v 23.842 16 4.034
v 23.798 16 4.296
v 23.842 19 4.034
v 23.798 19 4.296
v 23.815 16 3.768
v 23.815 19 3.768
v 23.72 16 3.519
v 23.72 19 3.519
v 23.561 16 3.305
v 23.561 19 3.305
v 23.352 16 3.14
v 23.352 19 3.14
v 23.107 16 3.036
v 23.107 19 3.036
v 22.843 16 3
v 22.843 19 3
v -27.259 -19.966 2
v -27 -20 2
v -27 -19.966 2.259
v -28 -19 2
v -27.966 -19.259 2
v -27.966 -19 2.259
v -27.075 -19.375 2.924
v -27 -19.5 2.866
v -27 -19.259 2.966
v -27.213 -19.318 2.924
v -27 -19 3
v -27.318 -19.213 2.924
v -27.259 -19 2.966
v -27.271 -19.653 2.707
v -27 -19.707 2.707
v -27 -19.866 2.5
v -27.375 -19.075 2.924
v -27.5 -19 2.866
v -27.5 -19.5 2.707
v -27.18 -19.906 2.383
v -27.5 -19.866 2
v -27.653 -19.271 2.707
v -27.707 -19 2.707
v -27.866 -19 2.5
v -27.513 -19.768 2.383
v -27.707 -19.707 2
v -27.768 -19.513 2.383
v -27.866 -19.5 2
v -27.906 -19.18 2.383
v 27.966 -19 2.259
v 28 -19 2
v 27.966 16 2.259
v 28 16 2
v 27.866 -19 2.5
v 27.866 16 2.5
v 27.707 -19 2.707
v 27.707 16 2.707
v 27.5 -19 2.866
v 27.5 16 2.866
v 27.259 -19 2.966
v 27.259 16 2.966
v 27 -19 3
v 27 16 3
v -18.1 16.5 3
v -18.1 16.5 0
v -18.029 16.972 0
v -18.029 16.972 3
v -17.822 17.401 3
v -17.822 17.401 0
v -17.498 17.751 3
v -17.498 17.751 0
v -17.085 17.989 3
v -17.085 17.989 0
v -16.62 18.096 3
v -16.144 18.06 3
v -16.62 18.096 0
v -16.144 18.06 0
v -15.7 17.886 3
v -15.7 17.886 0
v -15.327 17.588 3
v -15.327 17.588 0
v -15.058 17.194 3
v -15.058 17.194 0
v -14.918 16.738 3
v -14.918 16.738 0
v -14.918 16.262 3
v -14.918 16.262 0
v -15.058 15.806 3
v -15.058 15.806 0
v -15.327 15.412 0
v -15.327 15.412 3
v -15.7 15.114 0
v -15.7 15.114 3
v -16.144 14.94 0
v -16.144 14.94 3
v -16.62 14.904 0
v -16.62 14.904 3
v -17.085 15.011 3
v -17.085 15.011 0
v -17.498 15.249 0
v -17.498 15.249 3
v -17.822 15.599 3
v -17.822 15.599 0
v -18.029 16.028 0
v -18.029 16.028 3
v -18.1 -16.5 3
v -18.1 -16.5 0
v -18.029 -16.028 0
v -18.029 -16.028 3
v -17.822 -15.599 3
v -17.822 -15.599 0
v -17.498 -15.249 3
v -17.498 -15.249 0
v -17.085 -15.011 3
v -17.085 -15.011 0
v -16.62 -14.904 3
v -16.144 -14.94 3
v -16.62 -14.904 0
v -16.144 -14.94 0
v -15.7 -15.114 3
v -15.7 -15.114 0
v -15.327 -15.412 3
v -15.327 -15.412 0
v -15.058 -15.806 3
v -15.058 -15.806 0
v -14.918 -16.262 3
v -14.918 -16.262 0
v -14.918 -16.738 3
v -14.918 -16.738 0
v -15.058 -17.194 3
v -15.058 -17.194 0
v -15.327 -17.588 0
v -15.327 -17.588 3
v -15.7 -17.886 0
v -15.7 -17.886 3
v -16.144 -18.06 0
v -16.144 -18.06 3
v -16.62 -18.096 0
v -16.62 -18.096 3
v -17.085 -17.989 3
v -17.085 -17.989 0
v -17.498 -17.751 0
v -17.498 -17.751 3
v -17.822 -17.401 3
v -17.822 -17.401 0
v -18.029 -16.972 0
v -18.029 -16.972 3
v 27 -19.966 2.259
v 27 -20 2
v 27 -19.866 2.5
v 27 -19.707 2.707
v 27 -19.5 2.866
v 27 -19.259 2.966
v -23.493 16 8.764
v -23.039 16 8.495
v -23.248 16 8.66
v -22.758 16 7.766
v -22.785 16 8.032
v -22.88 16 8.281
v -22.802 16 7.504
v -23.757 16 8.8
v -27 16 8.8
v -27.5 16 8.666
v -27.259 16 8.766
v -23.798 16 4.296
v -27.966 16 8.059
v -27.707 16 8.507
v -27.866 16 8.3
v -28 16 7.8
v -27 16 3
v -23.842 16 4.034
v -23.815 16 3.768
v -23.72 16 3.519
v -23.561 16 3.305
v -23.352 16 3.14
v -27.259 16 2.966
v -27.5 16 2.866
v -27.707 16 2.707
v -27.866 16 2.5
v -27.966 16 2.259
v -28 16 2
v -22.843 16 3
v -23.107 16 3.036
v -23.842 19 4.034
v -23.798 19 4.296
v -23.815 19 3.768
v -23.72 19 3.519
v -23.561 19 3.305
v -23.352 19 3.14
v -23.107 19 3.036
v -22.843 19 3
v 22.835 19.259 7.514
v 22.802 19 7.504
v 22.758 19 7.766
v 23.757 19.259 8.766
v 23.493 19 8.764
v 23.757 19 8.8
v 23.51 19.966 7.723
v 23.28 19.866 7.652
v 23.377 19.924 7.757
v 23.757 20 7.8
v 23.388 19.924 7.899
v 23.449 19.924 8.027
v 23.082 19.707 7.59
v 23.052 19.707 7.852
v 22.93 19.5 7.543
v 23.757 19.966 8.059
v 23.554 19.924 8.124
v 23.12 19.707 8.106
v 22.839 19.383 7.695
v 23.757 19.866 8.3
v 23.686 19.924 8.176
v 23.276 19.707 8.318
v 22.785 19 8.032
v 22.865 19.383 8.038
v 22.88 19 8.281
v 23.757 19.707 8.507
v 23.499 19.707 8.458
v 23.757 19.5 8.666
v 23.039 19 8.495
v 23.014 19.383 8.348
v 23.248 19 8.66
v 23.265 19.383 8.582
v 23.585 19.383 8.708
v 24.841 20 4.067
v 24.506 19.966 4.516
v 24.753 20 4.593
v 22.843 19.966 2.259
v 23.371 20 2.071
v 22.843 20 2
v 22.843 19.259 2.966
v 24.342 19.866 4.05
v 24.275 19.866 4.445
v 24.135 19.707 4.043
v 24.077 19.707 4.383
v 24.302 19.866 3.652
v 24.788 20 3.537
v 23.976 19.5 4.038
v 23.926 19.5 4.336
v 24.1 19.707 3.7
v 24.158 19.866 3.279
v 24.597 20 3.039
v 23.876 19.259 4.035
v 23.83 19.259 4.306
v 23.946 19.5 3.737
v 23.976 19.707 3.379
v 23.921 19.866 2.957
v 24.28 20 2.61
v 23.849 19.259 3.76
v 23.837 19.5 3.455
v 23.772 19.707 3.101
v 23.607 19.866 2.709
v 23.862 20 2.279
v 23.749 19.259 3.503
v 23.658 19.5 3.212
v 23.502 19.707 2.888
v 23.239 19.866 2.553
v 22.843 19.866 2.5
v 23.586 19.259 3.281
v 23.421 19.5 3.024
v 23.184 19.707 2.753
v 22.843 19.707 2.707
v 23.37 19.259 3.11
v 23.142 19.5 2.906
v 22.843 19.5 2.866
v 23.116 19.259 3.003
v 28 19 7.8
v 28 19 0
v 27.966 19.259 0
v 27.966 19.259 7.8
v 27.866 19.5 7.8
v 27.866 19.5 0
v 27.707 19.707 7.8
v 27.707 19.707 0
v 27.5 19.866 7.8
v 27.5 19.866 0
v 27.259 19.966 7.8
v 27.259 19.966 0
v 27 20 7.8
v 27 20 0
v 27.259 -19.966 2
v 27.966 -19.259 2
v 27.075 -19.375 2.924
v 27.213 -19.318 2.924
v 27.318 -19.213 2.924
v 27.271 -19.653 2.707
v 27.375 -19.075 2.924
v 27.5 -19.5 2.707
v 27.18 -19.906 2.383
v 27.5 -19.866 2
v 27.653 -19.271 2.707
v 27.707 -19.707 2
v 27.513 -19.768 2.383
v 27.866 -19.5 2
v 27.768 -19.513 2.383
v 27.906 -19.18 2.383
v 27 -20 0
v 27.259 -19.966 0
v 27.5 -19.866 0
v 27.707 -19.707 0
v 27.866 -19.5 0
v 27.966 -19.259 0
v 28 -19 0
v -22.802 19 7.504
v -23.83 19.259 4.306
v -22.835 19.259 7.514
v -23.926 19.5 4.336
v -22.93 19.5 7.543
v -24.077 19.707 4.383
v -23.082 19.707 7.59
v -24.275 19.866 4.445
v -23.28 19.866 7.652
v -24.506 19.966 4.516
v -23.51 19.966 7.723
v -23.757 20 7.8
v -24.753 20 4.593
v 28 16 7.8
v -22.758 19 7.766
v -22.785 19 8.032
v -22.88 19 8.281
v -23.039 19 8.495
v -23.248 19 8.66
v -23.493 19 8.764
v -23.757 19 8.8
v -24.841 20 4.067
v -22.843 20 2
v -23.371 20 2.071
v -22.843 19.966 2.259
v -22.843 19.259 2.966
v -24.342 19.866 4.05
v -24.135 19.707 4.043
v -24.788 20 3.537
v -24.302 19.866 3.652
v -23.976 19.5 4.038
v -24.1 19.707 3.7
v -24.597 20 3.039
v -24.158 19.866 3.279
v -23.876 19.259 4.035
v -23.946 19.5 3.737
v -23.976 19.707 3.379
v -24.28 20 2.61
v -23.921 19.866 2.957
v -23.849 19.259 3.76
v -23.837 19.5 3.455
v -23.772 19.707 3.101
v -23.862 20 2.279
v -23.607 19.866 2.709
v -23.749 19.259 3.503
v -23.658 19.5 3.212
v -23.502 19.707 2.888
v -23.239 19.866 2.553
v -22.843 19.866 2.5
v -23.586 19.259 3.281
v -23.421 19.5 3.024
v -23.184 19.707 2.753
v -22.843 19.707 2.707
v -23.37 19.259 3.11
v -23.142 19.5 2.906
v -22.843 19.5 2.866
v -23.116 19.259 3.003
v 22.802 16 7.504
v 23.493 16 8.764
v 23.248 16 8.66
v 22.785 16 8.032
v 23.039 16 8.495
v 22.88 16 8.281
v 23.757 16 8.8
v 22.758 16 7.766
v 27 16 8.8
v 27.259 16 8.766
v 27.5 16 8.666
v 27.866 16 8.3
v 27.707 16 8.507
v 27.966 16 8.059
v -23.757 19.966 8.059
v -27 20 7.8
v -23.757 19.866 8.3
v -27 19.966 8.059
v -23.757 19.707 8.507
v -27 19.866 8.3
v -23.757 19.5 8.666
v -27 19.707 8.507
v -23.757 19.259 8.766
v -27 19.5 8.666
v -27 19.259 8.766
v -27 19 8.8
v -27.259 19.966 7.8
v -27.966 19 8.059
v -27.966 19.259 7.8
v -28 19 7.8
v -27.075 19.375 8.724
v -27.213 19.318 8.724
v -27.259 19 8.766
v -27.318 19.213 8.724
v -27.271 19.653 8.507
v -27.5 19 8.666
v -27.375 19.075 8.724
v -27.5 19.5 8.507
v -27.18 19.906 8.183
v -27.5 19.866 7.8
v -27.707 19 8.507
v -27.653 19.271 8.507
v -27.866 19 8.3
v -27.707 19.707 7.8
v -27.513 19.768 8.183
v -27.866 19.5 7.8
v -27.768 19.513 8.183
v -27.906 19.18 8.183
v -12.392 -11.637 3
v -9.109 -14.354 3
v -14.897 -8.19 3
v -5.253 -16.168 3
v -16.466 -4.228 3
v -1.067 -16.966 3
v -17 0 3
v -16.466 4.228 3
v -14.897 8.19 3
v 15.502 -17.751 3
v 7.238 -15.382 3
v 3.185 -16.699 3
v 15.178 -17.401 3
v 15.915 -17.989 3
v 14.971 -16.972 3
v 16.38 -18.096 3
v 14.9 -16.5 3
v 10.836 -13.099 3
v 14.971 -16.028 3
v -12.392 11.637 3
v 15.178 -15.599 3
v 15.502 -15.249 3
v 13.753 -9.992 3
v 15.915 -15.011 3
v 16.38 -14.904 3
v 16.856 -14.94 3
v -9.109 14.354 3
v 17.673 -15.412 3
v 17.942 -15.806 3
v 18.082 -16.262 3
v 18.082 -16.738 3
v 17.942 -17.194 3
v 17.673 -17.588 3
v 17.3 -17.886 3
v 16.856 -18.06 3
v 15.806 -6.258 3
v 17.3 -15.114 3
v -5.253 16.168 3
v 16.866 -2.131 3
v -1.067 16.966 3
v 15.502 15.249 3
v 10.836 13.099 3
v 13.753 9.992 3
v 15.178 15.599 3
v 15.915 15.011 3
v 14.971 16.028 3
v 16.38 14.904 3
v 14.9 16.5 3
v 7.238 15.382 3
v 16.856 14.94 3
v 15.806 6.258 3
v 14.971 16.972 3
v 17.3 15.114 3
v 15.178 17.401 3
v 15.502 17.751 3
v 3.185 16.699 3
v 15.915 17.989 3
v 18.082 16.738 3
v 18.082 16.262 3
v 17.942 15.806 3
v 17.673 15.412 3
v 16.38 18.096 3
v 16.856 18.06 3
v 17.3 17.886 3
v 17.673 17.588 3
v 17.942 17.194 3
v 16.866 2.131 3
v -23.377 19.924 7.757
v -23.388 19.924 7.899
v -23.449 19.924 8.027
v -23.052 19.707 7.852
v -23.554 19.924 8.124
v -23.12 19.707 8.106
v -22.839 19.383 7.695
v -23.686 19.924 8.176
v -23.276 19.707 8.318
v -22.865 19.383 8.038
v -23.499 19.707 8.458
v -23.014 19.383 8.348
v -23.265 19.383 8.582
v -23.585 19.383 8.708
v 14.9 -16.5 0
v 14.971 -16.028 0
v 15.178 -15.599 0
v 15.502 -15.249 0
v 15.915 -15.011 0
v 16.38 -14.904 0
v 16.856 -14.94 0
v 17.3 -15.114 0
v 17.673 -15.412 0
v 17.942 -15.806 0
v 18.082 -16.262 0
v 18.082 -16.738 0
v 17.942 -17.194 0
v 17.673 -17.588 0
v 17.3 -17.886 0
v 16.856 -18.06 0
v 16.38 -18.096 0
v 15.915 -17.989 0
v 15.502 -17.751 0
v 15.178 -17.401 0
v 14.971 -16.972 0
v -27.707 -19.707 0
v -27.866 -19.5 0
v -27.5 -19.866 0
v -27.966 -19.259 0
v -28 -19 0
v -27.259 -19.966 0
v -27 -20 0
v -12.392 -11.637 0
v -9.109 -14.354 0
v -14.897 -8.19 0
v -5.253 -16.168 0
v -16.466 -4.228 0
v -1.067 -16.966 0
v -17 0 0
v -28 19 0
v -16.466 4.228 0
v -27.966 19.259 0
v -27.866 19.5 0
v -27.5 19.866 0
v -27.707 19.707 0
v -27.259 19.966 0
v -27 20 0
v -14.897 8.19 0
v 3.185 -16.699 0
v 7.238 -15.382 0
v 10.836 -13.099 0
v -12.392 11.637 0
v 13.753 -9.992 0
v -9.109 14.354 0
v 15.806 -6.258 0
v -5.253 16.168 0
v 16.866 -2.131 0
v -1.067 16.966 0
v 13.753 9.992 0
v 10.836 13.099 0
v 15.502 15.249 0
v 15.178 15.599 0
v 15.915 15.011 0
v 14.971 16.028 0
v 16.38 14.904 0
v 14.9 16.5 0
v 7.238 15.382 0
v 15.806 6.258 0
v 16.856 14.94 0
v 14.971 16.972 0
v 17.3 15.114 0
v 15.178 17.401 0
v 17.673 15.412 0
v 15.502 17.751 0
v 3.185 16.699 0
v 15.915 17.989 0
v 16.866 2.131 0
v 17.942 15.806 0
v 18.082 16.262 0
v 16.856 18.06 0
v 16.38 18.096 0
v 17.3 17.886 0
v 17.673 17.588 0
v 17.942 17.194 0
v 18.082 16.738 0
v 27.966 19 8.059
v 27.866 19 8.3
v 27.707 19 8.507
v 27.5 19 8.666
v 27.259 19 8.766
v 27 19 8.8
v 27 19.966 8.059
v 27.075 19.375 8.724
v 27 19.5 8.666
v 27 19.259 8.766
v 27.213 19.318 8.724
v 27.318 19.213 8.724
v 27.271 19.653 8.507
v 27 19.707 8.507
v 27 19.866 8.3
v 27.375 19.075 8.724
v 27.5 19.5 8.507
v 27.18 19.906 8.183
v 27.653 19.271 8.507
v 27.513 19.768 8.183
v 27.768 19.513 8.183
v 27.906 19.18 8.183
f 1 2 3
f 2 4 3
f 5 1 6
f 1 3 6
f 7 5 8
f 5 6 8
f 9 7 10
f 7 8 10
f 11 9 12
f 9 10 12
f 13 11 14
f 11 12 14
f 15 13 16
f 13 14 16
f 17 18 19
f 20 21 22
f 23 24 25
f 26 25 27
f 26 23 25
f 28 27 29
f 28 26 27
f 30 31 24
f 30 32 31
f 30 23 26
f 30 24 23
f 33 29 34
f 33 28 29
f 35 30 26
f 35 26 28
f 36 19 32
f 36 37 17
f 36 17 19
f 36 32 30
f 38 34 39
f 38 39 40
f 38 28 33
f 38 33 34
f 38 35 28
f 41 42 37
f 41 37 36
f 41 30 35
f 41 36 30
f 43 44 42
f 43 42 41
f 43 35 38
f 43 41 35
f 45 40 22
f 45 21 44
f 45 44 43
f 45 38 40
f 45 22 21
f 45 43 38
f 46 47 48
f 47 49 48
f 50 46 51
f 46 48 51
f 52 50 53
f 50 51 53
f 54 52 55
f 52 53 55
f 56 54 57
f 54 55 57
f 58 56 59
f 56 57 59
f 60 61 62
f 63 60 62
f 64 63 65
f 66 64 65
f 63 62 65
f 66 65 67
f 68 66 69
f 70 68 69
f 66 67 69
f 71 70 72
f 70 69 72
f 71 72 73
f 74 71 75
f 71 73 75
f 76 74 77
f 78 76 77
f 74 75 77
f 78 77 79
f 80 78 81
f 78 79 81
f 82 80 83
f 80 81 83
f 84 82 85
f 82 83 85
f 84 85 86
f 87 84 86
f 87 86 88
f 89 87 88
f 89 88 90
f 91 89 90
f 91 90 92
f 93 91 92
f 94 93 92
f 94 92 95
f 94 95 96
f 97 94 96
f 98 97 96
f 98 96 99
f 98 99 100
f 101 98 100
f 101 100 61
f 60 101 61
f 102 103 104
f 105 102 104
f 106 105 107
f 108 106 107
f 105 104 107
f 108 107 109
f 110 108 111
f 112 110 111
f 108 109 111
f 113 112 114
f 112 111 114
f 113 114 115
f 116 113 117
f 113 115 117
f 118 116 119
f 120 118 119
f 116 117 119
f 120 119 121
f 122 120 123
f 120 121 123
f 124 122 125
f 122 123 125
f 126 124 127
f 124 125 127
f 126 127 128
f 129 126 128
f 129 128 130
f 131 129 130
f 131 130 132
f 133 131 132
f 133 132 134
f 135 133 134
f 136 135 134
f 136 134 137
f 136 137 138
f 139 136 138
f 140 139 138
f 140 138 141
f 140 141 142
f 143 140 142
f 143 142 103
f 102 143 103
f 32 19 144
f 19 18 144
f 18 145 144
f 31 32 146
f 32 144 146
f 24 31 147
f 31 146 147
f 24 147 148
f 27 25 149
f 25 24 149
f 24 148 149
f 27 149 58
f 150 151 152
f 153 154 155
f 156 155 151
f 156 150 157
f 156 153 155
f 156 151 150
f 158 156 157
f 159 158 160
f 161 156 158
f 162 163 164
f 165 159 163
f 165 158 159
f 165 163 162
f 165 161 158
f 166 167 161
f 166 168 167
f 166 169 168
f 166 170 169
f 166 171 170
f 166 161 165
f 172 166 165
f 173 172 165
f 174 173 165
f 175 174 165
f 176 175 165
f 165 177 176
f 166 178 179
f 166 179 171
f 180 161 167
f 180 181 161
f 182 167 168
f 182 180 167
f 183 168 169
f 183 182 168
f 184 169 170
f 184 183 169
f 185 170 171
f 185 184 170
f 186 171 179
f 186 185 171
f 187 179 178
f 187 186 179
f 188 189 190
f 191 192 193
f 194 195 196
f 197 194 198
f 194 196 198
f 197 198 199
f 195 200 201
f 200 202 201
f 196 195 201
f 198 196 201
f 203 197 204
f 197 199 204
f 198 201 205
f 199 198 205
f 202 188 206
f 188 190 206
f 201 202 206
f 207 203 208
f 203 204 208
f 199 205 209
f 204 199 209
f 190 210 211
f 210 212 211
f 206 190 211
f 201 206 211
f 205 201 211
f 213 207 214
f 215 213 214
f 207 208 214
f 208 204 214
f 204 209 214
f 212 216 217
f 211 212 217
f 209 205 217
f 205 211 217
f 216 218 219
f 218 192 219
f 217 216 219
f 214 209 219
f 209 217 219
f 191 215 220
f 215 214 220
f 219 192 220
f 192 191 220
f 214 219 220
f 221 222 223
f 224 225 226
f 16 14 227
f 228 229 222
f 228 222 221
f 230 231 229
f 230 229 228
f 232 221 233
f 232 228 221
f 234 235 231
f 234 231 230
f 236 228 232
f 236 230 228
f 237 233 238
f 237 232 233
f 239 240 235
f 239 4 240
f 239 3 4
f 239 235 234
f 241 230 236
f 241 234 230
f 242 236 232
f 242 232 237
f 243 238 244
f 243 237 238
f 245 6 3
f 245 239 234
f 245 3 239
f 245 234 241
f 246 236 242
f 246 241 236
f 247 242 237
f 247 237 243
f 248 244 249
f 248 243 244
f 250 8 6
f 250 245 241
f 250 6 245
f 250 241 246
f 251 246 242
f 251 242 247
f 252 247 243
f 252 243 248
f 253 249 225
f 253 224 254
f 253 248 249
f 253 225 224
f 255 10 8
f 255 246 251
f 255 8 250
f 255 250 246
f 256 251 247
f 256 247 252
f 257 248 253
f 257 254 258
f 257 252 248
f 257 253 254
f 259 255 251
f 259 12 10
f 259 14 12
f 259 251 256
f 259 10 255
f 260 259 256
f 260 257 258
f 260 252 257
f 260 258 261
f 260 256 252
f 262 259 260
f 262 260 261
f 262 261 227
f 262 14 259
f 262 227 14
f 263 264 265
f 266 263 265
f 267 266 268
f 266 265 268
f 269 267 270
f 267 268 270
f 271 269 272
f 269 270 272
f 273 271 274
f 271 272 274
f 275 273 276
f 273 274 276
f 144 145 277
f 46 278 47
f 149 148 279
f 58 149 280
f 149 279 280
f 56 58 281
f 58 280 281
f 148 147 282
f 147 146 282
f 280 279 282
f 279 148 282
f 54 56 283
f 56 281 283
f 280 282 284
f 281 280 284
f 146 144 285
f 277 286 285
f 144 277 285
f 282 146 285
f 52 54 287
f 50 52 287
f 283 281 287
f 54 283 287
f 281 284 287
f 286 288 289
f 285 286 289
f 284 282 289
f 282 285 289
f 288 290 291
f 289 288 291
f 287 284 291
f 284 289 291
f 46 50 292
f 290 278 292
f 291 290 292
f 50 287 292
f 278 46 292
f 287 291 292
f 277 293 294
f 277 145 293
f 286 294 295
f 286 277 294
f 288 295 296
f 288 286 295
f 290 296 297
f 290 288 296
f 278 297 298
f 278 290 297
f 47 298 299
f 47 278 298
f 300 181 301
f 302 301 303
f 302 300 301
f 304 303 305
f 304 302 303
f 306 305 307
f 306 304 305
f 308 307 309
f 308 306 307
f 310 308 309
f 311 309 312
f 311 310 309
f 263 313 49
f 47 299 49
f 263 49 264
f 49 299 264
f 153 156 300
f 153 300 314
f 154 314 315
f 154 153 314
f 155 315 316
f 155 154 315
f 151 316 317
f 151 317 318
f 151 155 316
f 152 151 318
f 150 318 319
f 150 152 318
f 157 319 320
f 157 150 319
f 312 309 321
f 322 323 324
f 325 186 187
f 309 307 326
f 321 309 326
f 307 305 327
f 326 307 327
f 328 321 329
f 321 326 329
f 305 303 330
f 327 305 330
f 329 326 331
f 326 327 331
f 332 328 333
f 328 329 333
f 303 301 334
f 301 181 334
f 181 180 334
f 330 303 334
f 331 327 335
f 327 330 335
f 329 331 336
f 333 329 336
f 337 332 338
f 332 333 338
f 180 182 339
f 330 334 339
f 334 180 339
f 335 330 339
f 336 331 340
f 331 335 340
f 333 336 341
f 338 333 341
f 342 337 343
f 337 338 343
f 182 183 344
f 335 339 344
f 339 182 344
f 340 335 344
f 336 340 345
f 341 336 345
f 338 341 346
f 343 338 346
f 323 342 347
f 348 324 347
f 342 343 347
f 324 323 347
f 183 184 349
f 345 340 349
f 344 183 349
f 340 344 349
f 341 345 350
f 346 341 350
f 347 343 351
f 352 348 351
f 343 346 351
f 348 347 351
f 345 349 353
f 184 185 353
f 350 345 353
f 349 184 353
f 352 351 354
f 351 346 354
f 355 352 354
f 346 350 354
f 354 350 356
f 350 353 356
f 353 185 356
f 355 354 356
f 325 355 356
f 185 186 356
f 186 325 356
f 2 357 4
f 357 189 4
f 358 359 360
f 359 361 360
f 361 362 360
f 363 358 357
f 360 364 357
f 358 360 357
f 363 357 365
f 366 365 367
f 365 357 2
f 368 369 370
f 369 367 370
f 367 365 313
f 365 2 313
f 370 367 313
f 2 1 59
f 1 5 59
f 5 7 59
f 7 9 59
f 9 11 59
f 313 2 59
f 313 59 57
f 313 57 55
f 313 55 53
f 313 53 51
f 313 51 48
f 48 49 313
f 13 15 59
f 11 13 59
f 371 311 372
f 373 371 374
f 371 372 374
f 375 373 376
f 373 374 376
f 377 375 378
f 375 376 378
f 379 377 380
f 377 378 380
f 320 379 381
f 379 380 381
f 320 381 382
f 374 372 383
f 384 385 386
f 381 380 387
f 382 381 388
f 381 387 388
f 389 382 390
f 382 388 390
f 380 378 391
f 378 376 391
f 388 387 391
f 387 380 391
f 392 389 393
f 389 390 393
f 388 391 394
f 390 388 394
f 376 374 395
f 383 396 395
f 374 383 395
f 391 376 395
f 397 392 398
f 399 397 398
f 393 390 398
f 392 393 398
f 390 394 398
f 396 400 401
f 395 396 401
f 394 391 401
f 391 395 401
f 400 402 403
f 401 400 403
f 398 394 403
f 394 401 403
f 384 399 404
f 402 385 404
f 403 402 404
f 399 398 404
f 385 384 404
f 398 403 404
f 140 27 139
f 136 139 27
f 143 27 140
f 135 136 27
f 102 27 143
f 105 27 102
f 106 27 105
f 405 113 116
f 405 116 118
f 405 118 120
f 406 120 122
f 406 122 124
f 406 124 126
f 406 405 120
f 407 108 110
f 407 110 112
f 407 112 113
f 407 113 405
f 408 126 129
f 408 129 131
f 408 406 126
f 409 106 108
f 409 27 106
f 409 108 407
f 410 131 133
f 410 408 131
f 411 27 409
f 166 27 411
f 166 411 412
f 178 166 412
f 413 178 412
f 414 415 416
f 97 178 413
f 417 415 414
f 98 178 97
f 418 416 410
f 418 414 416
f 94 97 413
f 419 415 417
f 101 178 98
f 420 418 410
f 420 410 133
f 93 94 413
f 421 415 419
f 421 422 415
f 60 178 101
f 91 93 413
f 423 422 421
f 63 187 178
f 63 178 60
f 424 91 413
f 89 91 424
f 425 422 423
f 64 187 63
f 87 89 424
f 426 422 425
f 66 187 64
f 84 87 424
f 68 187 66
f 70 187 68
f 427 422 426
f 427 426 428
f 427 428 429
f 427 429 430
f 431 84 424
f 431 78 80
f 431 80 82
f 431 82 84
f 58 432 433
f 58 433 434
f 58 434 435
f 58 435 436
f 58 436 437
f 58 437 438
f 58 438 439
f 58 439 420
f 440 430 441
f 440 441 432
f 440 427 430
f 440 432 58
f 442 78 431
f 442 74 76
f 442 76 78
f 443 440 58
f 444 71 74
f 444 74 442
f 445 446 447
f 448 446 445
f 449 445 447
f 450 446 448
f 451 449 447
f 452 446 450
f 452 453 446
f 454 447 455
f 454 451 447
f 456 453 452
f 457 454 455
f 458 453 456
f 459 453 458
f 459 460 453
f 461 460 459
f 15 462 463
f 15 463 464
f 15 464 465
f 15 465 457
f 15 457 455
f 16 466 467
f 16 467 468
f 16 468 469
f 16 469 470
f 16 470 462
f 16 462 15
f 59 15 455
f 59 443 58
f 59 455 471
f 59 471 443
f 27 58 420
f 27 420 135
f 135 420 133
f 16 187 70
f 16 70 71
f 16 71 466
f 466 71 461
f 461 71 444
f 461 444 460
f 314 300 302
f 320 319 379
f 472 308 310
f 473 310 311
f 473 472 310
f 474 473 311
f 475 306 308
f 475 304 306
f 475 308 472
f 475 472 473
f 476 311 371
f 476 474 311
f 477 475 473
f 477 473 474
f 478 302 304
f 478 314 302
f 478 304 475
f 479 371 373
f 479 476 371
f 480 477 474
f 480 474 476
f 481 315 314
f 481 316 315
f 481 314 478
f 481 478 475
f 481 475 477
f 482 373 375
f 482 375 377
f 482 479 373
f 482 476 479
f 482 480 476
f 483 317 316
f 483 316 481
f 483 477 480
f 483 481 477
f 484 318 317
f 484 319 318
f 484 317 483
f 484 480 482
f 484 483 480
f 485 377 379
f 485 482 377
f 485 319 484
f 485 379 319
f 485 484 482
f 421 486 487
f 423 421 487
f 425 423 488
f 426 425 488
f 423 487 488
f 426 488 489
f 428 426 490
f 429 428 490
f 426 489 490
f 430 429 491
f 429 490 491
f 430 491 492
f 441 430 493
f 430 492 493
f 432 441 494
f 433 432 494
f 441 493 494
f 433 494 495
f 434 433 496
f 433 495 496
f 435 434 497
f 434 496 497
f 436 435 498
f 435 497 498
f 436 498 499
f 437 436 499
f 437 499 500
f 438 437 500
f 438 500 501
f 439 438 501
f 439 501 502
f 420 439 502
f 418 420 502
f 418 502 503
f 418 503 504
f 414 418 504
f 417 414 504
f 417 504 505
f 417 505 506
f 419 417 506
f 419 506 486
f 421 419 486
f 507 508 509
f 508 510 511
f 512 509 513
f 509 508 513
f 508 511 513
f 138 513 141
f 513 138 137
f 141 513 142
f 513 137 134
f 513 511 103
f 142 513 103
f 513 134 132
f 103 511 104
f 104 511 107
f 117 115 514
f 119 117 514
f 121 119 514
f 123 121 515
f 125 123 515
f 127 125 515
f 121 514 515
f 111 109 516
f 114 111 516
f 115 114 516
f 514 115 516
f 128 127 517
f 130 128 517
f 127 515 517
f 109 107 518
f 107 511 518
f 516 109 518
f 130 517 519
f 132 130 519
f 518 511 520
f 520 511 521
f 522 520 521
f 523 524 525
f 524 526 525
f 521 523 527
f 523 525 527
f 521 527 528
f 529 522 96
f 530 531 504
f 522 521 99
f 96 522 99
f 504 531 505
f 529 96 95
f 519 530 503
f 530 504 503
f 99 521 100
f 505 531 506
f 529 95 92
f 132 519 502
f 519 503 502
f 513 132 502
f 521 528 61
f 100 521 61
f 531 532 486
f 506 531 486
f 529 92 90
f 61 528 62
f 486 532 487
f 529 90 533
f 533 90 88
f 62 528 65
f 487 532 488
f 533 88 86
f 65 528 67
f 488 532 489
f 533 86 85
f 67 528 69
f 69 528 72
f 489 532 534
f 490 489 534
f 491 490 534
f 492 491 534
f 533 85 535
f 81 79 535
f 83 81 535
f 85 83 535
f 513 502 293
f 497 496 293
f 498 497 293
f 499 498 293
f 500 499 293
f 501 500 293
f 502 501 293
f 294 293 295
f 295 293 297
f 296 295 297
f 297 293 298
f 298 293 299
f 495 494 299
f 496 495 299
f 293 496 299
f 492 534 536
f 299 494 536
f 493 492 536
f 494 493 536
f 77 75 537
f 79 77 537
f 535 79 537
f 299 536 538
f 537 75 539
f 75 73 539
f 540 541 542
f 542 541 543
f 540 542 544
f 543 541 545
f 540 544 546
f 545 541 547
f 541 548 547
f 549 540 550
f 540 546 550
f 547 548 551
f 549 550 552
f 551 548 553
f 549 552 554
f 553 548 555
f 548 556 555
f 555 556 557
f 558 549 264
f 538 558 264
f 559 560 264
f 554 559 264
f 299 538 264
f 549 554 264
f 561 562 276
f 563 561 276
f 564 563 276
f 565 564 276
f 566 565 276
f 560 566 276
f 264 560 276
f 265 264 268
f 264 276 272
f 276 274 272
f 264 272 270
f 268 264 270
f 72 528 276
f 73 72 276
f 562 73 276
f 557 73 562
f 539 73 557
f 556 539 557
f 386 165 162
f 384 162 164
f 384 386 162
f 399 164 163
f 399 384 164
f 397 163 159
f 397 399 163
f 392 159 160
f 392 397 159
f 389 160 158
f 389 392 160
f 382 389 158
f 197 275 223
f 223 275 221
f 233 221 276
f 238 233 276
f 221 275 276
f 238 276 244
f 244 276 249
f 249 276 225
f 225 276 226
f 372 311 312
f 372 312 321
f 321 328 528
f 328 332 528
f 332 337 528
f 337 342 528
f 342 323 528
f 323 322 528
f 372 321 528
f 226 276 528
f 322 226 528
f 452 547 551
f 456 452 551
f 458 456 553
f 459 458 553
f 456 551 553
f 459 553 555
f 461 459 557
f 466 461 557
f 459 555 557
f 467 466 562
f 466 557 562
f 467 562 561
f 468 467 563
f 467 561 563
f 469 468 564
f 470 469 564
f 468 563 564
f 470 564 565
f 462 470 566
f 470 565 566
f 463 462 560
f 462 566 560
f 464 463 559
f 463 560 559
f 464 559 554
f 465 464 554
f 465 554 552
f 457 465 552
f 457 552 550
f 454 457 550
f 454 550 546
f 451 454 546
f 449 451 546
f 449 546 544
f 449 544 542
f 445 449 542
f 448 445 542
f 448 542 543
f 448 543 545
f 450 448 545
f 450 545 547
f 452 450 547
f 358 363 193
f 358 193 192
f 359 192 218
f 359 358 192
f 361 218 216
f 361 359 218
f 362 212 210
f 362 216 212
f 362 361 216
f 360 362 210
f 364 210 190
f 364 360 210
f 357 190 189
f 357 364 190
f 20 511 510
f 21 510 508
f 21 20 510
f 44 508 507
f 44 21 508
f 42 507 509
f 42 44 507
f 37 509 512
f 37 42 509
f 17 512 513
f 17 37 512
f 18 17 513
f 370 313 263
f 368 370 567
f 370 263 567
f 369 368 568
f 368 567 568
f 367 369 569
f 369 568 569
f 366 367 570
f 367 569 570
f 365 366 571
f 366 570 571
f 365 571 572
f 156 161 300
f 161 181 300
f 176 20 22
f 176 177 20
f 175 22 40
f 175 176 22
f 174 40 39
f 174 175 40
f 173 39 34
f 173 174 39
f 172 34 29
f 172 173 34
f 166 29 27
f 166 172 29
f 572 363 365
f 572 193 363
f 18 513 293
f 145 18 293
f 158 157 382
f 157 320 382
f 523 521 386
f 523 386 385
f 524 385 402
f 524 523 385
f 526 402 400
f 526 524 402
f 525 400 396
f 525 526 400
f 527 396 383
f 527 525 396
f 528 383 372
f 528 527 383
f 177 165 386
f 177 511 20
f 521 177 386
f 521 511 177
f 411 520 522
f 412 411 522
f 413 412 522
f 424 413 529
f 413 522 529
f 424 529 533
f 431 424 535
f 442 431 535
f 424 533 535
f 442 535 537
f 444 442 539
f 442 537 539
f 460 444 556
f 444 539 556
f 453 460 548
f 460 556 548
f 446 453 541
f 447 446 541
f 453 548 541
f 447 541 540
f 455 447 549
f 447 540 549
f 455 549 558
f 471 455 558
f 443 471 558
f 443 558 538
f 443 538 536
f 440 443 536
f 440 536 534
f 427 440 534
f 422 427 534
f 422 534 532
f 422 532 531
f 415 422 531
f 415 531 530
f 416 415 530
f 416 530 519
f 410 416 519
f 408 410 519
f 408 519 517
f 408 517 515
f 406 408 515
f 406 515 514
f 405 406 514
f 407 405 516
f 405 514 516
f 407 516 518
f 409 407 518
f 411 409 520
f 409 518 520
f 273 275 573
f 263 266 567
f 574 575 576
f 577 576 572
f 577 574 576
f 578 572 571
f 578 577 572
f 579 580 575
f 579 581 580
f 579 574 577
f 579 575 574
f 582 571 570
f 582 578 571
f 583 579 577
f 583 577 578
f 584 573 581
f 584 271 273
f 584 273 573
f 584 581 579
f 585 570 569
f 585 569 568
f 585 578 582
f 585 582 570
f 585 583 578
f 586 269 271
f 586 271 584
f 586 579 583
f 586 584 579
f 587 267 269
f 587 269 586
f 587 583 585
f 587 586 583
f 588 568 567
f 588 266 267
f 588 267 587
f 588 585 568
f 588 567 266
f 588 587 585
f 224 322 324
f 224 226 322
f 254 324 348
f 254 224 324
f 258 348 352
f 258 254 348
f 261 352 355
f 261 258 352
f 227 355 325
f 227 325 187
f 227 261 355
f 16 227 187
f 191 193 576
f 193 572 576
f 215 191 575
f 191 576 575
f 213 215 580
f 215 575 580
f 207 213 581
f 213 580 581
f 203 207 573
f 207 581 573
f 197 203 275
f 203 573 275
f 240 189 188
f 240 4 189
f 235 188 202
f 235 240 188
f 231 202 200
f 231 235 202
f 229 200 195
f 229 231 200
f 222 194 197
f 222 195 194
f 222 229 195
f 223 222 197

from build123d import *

# Parameters (mm, degrees)
ESQUISSE1_W             = 56
ESQUISSE1_H             = 40
BOSS_EXTRU_1_DEPTH      = 3
ESQUISSE2_W             = 3.8
ESQUISSE2_H             = 4
BOSS_EXTRU_2_DEPTH      = 5.8
BOSS_EXTRU_3_DEPTH      = 4
CONG_1_R                = 1
ESQUISSE4_R             = 1.6
ENL_V_MAT_EXTRU_1_DEPTH = 9.8
ESQUISSE5_R             = 17
ENL_V_MAT_EXTRU_2_DEPTH = 9.8


with BuildPart() as part:
    # Esquisse1 → Boss.-Extru.1 (new body)
    with BuildSketch(Plane.XY):
        Rectangle(ESQUISSE1_W, ESQUISSE1_H)
    extrude(amount=BOSS_EXTRU_1_DEPTH)

    # Esquisse2 → Boss.-Extru.2 (add)
    with BuildSketch(Plane.XY.offset(3)):
        with Locations((-26.1, 18)):
            Rectangle(ESQUISSE2_W, ESQUISSE2_H)
        with Locations((26.1, 18)):
            Rectangle(ESQUISSE2_W, ESQUISSE2_H)
    extrude(amount=BOSS_EXTRU_2_DEPTH)

    # Esquisse3 → Boss.-Extru.3 (add)
    with BuildSketch(Plane(origin=(0, 20, 0), x_dir=(1, 0, 0), z_dir=(0, 1, 0))):
        Polygon((-24.2, -3), (-22.4, -8.8), (-24.2, -8.8), align=None)
        Polygon((24.2, -3), (24.2, -8.8), (22.4, -8.8), align=None)
    extrude(amount=-BOSS_EXTRU_3_DEPTH)

    # Congé1
    cong_1_edges = [part.edges().sort_by_distance(p)[0] for p in [
        (23.3, 20, 5.9),
        (-23.3, 20, 5.9),
        (28, -20, 1.5),
        (-28, -20, 1.5),
        (-28, 20, 4.4),
        (28, 20, 4.4),
        (25.2, 20, 8.8),
        (-25.2, 20, 8.8),
        (0, 20, 3),
        (0, -20, 3),
        (28, -2, 3),
        (-28, -2, 3),
        (24.2, 18, 3),
        (22.4, 18, 8.8),
        (28, 18, 8.8),
        (-28, 18, 8.8),
        (-22.4, 18, 8.8),
        (-24.2, 18, 3),
    ]]
    fillet(cong_1_edges, radius=CONG_1_R)

    # Esquisse4 → Enlèv. mat.-Extru.1 (cut, through all)
    with BuildSketch(Plane(origin=(0, 0, 0), x_dir=(-1, 0, 0), z_dir=(0, 0, -1))):
        with Locations((-16.5, 16.5)):
            Circle(ESQUISSE4_R)
        with Locations((-16.5, -16.5)):
            Circle(ESQUISSE4_R)
        with Locations((16.5, 16.5)):
            Circle(ESQUISSE4_R)
        with Locations((16.5, -16.5)):
            Circle(ESQUISSE4_R)
    extrude(amount=-ENL_V_MAT_EXTRU_1_DEPTH, mode=Mode.SUBTRACT)

    # Esquisse5 → Enlèv. mat.-Extru.2 (cut, through all)
    with BuildSketch(Plane(origin=(0, 0, 0), x_dir=(-1, 0, 0), z_dir=(0, 0, -1))):
        Circle(ESQUISSE5_R)
    extrude(amount=-ENL_V_MAT_EXTRU_2_DEPTH, mode=Mode.SUBTRACT)


solid = part.part
